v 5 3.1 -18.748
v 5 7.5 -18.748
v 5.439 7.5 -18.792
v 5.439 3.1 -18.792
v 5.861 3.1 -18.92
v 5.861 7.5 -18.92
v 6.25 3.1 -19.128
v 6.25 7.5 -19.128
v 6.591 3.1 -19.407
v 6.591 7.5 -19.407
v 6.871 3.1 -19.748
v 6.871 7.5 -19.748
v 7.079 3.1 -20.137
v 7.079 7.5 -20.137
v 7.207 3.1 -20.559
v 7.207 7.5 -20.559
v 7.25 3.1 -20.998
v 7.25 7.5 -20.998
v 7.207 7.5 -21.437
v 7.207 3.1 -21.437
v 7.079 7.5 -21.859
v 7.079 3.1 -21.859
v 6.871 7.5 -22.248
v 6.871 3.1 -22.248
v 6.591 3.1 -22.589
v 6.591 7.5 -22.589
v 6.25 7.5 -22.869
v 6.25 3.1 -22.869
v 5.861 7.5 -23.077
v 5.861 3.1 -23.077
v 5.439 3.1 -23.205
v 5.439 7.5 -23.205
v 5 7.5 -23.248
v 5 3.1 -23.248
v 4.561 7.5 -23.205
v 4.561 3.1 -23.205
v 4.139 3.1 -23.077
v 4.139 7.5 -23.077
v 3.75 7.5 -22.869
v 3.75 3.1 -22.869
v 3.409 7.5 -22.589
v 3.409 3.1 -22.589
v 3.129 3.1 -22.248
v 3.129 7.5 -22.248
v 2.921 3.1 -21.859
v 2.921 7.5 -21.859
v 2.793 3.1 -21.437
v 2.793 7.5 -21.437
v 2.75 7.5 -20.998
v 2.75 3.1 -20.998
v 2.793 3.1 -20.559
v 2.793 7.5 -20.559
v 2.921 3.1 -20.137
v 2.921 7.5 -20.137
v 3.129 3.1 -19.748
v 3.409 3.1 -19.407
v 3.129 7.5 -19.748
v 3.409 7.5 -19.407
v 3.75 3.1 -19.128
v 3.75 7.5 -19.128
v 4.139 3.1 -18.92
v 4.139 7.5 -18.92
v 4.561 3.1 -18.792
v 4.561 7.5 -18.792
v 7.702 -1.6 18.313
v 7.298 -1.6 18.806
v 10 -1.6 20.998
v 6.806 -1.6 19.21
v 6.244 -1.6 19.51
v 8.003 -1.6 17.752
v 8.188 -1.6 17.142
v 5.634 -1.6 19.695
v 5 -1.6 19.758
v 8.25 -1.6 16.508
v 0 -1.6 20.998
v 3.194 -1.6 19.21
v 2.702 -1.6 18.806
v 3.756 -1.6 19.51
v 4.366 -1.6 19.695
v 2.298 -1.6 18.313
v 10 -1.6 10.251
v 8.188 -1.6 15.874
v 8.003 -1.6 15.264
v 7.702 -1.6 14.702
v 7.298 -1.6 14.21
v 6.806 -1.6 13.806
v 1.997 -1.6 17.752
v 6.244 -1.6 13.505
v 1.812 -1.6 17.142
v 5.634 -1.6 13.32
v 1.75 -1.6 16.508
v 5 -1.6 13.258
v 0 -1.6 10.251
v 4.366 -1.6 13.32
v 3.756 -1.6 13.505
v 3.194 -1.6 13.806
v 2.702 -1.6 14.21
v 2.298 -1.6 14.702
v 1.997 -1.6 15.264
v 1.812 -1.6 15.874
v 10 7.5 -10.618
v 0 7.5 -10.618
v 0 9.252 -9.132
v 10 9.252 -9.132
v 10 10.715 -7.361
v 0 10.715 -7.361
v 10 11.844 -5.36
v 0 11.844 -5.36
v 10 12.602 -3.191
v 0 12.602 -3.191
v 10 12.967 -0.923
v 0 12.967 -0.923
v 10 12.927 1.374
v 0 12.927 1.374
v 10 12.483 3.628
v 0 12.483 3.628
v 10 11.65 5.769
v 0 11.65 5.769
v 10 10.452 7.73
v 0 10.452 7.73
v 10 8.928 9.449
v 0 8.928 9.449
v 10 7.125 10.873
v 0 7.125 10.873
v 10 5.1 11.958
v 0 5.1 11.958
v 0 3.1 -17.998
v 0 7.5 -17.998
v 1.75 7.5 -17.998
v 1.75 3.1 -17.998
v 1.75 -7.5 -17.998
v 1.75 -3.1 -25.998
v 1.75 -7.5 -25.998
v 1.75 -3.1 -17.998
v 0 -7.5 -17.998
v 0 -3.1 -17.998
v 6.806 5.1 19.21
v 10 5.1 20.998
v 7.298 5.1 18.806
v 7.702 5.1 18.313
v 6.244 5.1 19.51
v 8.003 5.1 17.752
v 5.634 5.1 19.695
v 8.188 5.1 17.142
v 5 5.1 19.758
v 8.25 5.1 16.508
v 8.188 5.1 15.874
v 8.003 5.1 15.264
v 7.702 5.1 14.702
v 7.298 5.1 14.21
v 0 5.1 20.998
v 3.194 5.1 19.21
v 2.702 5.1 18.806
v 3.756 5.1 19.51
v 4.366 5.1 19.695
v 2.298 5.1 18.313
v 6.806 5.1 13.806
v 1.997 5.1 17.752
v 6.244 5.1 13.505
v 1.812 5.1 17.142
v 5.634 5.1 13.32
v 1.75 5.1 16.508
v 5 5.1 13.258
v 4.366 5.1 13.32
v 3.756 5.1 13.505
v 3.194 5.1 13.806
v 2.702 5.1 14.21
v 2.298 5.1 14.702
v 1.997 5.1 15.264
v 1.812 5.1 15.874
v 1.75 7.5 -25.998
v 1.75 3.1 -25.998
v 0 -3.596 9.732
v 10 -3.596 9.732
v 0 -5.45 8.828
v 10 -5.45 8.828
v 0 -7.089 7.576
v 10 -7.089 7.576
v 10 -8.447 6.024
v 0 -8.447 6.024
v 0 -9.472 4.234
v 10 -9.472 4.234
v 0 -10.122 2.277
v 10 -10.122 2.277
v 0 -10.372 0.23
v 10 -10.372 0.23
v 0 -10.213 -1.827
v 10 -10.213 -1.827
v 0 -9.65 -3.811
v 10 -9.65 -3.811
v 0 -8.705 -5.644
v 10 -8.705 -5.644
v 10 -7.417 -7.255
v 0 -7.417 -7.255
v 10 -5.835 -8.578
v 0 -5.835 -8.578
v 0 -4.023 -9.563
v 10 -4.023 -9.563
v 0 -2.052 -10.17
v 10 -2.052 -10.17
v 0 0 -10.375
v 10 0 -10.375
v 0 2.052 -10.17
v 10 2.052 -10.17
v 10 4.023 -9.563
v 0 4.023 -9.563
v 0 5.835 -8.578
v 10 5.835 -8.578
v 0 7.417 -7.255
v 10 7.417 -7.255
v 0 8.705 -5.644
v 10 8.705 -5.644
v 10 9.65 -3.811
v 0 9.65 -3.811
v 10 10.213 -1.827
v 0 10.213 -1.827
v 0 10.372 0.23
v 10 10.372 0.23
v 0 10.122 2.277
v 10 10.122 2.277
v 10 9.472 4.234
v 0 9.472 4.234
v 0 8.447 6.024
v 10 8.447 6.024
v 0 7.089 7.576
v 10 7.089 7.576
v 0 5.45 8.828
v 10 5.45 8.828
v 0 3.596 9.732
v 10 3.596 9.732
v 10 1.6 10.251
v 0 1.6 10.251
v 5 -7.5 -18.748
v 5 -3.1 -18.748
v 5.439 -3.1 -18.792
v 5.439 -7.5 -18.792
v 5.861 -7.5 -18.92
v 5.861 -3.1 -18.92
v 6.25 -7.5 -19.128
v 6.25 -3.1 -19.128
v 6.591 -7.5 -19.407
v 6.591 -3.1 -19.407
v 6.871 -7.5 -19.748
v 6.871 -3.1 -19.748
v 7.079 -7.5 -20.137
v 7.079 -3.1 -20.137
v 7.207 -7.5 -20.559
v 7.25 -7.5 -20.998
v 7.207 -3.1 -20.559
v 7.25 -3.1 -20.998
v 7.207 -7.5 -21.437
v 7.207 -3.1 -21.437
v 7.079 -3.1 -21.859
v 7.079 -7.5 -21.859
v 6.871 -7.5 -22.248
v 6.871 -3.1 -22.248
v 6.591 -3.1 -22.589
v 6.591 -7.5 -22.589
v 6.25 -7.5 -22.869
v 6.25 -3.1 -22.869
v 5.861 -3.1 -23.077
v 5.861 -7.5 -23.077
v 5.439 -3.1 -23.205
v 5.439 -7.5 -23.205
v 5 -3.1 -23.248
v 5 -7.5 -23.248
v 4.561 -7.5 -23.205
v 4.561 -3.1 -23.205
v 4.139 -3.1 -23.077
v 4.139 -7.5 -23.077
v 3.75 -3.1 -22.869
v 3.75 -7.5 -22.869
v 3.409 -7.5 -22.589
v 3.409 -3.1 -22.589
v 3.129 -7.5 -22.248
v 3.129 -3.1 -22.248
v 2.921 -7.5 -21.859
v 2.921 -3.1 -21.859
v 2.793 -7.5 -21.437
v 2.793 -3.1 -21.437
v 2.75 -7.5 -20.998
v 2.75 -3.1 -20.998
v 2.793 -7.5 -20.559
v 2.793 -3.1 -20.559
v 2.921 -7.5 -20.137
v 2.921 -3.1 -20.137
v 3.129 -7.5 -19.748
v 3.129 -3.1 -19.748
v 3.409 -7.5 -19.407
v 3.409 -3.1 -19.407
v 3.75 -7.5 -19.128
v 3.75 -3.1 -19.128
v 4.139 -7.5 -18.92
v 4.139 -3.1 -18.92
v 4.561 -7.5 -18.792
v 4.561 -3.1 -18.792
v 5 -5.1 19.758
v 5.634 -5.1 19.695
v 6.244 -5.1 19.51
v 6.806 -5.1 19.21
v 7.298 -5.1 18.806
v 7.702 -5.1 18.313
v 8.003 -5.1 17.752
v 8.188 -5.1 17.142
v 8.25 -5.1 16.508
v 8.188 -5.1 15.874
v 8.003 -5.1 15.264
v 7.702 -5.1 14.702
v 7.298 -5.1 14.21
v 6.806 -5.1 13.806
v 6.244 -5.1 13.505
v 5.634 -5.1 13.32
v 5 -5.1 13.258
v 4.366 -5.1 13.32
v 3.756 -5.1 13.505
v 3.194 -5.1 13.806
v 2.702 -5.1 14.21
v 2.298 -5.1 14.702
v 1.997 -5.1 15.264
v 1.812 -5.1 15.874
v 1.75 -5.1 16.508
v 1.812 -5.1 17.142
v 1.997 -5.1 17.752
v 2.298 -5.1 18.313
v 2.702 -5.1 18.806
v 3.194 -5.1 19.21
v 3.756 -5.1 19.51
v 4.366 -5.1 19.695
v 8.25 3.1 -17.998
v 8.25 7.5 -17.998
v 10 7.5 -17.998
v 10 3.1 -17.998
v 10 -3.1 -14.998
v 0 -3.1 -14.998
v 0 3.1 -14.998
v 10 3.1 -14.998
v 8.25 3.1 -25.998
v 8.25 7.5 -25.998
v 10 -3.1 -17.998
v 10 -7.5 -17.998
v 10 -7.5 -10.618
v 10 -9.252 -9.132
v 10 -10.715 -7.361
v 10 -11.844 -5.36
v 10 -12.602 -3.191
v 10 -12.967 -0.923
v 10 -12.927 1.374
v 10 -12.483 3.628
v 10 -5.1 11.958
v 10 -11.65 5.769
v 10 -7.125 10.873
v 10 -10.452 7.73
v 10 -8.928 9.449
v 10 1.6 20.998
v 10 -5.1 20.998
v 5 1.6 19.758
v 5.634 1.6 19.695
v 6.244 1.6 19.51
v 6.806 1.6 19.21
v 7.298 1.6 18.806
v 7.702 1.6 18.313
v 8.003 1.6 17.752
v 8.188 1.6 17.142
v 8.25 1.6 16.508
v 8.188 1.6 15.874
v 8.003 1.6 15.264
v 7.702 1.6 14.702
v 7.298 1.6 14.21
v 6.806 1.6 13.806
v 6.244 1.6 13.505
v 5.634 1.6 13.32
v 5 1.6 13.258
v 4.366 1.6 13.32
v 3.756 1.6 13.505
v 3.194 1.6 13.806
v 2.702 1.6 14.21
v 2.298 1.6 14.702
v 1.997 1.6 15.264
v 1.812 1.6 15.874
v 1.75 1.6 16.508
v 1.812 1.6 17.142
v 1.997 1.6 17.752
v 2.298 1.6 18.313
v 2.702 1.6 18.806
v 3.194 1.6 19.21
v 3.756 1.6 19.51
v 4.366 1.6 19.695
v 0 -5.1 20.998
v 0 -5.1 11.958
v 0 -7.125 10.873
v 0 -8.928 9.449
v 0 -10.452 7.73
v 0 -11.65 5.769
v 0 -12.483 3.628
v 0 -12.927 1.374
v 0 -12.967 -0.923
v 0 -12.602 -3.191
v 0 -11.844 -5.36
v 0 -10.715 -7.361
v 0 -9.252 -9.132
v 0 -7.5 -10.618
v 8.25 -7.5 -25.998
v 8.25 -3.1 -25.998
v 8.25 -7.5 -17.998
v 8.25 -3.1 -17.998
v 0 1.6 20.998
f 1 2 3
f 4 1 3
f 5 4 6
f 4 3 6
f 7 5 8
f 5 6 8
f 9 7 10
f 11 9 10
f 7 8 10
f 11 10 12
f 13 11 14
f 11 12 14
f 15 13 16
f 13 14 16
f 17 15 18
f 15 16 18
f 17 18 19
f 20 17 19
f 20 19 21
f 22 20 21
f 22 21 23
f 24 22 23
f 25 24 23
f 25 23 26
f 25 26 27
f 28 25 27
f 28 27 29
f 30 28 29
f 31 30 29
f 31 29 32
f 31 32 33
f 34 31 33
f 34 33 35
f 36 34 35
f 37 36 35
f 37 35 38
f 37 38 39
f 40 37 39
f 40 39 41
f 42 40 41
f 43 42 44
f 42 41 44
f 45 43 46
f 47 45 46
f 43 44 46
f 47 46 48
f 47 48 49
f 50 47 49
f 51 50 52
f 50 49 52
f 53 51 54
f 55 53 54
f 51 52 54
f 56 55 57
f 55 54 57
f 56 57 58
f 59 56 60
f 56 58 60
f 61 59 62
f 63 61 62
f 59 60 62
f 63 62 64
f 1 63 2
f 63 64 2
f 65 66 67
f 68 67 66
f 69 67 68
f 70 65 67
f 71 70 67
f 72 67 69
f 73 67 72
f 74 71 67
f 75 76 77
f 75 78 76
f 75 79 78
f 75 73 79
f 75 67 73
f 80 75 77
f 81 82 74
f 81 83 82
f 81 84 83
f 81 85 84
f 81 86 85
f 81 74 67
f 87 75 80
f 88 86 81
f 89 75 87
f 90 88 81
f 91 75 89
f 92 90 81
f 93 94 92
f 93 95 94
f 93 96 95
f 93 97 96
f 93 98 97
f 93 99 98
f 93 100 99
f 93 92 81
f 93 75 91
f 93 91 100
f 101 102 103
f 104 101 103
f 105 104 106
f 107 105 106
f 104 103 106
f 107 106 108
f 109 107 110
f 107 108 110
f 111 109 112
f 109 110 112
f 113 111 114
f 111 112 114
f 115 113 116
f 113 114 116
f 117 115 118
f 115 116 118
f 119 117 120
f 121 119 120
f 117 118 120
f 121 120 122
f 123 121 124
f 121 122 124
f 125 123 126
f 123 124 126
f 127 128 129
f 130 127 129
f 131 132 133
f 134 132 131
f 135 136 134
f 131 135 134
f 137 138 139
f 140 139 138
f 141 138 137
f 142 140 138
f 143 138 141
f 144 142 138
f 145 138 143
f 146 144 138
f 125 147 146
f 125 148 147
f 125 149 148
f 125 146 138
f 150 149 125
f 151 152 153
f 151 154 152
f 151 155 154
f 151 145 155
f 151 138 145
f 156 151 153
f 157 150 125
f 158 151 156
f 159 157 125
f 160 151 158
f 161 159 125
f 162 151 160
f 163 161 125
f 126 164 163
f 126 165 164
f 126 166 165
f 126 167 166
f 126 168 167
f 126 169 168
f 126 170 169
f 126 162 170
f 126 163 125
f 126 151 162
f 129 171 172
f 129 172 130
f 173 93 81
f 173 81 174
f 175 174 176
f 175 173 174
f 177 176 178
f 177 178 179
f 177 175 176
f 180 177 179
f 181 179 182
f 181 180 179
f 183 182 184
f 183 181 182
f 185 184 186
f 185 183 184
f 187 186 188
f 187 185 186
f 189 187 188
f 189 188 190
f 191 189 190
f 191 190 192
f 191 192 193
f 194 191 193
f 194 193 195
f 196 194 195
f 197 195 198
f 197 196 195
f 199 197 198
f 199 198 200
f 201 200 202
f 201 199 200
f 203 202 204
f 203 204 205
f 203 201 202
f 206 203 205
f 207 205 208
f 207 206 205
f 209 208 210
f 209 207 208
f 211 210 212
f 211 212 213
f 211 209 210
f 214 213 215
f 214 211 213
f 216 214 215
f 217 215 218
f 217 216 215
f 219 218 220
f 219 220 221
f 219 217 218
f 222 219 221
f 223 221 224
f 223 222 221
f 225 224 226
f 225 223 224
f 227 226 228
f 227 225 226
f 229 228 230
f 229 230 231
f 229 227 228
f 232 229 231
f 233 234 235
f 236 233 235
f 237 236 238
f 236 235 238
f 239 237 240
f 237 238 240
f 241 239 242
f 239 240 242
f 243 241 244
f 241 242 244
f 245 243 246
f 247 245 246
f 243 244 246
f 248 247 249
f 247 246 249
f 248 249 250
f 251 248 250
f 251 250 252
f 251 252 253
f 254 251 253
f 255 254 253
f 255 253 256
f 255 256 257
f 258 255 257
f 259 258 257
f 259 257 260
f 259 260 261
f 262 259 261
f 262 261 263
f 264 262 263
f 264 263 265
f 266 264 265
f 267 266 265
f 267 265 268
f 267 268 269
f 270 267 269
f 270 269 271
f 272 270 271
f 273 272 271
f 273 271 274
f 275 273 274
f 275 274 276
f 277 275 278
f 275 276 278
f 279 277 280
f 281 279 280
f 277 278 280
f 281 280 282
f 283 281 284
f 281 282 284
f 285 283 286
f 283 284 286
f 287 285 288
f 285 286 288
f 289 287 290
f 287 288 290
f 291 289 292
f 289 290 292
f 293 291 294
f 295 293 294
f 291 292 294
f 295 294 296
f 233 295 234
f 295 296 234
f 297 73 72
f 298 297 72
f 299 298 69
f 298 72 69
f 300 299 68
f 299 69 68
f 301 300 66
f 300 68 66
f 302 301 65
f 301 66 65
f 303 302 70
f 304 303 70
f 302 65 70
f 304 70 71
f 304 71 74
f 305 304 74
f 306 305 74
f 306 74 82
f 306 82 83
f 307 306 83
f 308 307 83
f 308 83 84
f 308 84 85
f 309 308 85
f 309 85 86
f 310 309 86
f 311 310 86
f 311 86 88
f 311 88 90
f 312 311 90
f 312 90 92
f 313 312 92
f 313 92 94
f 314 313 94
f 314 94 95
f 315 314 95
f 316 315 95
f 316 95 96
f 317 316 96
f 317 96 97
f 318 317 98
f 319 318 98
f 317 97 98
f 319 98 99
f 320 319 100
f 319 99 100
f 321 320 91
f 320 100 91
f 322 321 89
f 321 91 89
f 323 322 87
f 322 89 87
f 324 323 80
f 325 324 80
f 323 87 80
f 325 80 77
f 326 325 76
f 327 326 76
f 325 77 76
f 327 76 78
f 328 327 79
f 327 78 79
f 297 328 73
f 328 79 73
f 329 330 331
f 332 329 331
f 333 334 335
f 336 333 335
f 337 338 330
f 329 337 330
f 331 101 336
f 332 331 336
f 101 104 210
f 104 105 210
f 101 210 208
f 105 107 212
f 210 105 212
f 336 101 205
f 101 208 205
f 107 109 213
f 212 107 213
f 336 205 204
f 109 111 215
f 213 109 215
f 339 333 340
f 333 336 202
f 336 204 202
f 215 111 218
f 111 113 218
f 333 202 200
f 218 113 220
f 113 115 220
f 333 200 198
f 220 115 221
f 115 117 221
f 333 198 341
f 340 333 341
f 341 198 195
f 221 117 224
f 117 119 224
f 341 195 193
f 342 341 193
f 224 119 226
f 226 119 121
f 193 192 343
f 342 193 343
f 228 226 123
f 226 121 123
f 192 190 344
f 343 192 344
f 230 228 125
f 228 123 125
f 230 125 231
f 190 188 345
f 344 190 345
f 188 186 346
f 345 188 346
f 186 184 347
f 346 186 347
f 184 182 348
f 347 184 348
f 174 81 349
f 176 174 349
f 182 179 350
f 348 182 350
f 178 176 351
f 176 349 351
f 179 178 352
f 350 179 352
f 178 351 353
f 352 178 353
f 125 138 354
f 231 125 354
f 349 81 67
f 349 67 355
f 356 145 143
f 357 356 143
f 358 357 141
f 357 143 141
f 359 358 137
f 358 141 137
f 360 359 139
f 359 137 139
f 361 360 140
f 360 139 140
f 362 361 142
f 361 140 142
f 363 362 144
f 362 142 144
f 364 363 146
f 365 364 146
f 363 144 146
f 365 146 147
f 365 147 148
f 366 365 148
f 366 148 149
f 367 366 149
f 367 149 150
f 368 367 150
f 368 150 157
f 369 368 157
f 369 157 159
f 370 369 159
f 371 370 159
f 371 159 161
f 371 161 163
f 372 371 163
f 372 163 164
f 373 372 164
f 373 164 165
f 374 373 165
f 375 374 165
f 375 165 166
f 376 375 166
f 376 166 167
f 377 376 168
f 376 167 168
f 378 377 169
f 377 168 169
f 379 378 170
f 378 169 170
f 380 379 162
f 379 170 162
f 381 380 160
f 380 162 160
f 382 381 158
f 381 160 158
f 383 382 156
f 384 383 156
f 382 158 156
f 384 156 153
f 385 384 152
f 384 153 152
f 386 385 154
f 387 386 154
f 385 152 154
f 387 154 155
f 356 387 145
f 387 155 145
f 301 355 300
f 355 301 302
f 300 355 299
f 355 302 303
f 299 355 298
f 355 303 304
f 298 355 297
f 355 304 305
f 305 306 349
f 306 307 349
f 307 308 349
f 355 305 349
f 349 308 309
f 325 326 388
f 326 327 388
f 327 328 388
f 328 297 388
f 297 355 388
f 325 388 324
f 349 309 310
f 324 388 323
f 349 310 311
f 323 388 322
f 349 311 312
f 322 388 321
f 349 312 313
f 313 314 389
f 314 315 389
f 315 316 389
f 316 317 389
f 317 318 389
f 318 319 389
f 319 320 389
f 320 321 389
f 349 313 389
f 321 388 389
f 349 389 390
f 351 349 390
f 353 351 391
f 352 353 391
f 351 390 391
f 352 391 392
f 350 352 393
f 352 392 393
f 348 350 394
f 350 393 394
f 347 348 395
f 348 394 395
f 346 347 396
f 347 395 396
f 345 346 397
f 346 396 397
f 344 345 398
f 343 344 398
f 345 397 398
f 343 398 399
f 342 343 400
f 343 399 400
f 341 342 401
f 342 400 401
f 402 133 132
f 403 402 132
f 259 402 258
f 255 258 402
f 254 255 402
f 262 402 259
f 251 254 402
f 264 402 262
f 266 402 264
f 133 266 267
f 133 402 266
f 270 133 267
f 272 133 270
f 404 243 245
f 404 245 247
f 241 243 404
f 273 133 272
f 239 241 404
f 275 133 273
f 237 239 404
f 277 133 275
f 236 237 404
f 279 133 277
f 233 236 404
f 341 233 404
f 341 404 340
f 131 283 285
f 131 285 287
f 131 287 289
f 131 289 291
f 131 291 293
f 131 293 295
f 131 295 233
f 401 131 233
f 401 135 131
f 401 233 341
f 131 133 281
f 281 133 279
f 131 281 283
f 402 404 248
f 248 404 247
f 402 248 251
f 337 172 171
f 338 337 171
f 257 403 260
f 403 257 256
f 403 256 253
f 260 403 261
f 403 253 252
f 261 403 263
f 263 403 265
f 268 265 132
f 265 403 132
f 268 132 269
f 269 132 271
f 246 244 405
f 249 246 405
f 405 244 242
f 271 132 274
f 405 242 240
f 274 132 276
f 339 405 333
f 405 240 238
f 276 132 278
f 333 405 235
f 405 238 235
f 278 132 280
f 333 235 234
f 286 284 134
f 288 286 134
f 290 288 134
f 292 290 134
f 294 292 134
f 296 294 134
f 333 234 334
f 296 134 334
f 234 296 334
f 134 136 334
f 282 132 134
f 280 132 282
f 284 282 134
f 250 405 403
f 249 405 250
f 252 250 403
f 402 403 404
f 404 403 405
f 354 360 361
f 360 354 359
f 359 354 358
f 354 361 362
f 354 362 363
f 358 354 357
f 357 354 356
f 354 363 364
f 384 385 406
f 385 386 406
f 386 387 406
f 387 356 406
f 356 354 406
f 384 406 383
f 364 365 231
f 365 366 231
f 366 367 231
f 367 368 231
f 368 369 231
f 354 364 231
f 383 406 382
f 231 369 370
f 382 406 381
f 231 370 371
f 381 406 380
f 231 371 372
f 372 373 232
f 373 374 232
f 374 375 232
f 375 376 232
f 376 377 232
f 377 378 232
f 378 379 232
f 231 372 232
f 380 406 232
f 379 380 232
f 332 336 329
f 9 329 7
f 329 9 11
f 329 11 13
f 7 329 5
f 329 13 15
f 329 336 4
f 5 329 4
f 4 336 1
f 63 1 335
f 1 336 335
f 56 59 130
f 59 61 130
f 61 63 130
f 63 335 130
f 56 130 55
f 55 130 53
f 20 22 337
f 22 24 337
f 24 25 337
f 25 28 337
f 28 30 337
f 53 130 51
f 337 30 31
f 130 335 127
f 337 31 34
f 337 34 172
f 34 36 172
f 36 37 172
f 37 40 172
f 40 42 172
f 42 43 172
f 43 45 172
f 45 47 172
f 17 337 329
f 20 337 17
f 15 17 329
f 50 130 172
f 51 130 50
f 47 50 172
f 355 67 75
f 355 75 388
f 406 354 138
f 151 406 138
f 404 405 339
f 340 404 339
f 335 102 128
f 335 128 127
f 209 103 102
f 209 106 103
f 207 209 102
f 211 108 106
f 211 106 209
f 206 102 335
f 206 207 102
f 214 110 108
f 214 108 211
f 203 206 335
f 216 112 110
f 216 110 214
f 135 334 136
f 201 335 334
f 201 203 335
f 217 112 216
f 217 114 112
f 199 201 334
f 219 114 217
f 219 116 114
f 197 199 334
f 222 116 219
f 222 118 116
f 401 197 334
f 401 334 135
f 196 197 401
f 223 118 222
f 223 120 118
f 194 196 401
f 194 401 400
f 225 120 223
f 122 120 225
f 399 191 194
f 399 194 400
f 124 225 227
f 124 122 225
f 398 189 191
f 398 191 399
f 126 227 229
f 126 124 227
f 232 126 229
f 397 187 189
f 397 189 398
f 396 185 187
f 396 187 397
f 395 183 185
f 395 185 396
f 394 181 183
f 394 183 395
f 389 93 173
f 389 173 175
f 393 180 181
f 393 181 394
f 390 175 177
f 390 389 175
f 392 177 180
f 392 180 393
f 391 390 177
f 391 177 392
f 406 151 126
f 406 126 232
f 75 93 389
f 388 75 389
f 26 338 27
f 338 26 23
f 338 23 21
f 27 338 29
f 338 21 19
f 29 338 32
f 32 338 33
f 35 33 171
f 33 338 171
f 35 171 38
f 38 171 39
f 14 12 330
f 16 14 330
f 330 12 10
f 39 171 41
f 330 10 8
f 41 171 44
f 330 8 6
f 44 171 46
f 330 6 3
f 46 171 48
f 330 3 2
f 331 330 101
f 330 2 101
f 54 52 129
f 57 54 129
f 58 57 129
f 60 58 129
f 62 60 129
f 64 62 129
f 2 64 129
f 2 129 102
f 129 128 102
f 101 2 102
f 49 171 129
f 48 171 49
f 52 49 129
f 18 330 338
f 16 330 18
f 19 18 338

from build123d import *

# Parameters (mm, degrees)
PAD_DEPTH       = 10
POCKET_DEPTH    = 10
SKETCH004_R     = 3.25
POCKET002_DEPTH = 15
SKETCH005_R     = 2.25
POCKET003_DEPTH = 15
SKETCH006_W     = 8
SKETCH006_H     = 1.75
POCKET004_DEPTH = 15


with BuildPart() as part:
    # Sketch → Pad (new body)
    with BuildSketch(Plane.YZ):
        with BuildLine():
            ThreePointArc((-1.6, 10.250884), (0, -10.375), (1.6, 10.250884))
            Line((1.6, 20.997843), (1.6, 10.250884))
            Line((1.6, 20.997843), (5.1, 20.997843))
            Line((5.1, 20.997843), (5.1, 11.957843))
            ThreePointArc((7.5, -10.61838), (12.92716, 1.374242), (5.1, 11.957843))
            Line((7.5, -25.99838), (7.5, -10.61838))
            Line((-7.5, -25.99838), (7.5, -25.99838))
            Line((-7.5, -25.99838), (-7.5, -10.61838))
            ThreePointArc((-5.1, 11.957843), (-12.92716, 1.374242), (-7.5, -10.61838))
            Line((-5.1, 20.997843), (-5.1, 11.957843))
            Line((-1.6, 20.997843), (-5.1, 20.997843))
            Line((-1.6, 20.997843), (-1.6, 10.250884))
        make_face()
    extrude(amount=PAD_DEPTH)

    # Sketch003 → Pocket (cut)
    with BuildSketch(Plane(origin=(0, 0, 0), x_dir=(0, 1, 0), z_dir=(-1, 0, 0))):
        Polygon((0, 25.99838), (-3.1, 25.99838), (-3.1, 14.99838), (0, 14.99838), (3.1, 14.99838), (3.1, 25.99838), align=None)
    extrude(amount=-POCKET_DEPTH, mode=Mode.SUBTRACT)

    # Sketch004 (on Face9 of Pocket) → Pocket002 (cut)
    with BuildSketch(Plane.ZX.offset(5.1)):
        with Locations((16.507843, 5)):
            Circle(SKETCH004_R)
    extrude(amount=-POCKET002_DEPTH, mode=Mode.SUBTRACT)

    # Sketch005 (on Face12 of Pocket002) → Pocket003 (cut)
    with BuildSketch(Plane.ZX.offset(7.5)):
        with Locations((-20.99838, 5)):
            Circle(SKETCH005_R)
    extrude(amount=-POCKET003_DEPTH, mode=Mode.SUBTRACT)

    # Sketch006 (on Face12 of Pocket003) → Pocket004 (cut)
    with BuildSketch(Plane.ZX.offset(7.5)):
        with Locations((-21.99838, 9.125)):
            Rectangle(SKETCH006_W, SKETCH006_H)
        with Locations((-21.99838, 0.875)):
            Rectangle(SKETCH006_W, SKETCH006_H)
    extrude(amount=-POCKET004_DEPTH, mode=Mode.SUBTRACT)


solid = part.part
